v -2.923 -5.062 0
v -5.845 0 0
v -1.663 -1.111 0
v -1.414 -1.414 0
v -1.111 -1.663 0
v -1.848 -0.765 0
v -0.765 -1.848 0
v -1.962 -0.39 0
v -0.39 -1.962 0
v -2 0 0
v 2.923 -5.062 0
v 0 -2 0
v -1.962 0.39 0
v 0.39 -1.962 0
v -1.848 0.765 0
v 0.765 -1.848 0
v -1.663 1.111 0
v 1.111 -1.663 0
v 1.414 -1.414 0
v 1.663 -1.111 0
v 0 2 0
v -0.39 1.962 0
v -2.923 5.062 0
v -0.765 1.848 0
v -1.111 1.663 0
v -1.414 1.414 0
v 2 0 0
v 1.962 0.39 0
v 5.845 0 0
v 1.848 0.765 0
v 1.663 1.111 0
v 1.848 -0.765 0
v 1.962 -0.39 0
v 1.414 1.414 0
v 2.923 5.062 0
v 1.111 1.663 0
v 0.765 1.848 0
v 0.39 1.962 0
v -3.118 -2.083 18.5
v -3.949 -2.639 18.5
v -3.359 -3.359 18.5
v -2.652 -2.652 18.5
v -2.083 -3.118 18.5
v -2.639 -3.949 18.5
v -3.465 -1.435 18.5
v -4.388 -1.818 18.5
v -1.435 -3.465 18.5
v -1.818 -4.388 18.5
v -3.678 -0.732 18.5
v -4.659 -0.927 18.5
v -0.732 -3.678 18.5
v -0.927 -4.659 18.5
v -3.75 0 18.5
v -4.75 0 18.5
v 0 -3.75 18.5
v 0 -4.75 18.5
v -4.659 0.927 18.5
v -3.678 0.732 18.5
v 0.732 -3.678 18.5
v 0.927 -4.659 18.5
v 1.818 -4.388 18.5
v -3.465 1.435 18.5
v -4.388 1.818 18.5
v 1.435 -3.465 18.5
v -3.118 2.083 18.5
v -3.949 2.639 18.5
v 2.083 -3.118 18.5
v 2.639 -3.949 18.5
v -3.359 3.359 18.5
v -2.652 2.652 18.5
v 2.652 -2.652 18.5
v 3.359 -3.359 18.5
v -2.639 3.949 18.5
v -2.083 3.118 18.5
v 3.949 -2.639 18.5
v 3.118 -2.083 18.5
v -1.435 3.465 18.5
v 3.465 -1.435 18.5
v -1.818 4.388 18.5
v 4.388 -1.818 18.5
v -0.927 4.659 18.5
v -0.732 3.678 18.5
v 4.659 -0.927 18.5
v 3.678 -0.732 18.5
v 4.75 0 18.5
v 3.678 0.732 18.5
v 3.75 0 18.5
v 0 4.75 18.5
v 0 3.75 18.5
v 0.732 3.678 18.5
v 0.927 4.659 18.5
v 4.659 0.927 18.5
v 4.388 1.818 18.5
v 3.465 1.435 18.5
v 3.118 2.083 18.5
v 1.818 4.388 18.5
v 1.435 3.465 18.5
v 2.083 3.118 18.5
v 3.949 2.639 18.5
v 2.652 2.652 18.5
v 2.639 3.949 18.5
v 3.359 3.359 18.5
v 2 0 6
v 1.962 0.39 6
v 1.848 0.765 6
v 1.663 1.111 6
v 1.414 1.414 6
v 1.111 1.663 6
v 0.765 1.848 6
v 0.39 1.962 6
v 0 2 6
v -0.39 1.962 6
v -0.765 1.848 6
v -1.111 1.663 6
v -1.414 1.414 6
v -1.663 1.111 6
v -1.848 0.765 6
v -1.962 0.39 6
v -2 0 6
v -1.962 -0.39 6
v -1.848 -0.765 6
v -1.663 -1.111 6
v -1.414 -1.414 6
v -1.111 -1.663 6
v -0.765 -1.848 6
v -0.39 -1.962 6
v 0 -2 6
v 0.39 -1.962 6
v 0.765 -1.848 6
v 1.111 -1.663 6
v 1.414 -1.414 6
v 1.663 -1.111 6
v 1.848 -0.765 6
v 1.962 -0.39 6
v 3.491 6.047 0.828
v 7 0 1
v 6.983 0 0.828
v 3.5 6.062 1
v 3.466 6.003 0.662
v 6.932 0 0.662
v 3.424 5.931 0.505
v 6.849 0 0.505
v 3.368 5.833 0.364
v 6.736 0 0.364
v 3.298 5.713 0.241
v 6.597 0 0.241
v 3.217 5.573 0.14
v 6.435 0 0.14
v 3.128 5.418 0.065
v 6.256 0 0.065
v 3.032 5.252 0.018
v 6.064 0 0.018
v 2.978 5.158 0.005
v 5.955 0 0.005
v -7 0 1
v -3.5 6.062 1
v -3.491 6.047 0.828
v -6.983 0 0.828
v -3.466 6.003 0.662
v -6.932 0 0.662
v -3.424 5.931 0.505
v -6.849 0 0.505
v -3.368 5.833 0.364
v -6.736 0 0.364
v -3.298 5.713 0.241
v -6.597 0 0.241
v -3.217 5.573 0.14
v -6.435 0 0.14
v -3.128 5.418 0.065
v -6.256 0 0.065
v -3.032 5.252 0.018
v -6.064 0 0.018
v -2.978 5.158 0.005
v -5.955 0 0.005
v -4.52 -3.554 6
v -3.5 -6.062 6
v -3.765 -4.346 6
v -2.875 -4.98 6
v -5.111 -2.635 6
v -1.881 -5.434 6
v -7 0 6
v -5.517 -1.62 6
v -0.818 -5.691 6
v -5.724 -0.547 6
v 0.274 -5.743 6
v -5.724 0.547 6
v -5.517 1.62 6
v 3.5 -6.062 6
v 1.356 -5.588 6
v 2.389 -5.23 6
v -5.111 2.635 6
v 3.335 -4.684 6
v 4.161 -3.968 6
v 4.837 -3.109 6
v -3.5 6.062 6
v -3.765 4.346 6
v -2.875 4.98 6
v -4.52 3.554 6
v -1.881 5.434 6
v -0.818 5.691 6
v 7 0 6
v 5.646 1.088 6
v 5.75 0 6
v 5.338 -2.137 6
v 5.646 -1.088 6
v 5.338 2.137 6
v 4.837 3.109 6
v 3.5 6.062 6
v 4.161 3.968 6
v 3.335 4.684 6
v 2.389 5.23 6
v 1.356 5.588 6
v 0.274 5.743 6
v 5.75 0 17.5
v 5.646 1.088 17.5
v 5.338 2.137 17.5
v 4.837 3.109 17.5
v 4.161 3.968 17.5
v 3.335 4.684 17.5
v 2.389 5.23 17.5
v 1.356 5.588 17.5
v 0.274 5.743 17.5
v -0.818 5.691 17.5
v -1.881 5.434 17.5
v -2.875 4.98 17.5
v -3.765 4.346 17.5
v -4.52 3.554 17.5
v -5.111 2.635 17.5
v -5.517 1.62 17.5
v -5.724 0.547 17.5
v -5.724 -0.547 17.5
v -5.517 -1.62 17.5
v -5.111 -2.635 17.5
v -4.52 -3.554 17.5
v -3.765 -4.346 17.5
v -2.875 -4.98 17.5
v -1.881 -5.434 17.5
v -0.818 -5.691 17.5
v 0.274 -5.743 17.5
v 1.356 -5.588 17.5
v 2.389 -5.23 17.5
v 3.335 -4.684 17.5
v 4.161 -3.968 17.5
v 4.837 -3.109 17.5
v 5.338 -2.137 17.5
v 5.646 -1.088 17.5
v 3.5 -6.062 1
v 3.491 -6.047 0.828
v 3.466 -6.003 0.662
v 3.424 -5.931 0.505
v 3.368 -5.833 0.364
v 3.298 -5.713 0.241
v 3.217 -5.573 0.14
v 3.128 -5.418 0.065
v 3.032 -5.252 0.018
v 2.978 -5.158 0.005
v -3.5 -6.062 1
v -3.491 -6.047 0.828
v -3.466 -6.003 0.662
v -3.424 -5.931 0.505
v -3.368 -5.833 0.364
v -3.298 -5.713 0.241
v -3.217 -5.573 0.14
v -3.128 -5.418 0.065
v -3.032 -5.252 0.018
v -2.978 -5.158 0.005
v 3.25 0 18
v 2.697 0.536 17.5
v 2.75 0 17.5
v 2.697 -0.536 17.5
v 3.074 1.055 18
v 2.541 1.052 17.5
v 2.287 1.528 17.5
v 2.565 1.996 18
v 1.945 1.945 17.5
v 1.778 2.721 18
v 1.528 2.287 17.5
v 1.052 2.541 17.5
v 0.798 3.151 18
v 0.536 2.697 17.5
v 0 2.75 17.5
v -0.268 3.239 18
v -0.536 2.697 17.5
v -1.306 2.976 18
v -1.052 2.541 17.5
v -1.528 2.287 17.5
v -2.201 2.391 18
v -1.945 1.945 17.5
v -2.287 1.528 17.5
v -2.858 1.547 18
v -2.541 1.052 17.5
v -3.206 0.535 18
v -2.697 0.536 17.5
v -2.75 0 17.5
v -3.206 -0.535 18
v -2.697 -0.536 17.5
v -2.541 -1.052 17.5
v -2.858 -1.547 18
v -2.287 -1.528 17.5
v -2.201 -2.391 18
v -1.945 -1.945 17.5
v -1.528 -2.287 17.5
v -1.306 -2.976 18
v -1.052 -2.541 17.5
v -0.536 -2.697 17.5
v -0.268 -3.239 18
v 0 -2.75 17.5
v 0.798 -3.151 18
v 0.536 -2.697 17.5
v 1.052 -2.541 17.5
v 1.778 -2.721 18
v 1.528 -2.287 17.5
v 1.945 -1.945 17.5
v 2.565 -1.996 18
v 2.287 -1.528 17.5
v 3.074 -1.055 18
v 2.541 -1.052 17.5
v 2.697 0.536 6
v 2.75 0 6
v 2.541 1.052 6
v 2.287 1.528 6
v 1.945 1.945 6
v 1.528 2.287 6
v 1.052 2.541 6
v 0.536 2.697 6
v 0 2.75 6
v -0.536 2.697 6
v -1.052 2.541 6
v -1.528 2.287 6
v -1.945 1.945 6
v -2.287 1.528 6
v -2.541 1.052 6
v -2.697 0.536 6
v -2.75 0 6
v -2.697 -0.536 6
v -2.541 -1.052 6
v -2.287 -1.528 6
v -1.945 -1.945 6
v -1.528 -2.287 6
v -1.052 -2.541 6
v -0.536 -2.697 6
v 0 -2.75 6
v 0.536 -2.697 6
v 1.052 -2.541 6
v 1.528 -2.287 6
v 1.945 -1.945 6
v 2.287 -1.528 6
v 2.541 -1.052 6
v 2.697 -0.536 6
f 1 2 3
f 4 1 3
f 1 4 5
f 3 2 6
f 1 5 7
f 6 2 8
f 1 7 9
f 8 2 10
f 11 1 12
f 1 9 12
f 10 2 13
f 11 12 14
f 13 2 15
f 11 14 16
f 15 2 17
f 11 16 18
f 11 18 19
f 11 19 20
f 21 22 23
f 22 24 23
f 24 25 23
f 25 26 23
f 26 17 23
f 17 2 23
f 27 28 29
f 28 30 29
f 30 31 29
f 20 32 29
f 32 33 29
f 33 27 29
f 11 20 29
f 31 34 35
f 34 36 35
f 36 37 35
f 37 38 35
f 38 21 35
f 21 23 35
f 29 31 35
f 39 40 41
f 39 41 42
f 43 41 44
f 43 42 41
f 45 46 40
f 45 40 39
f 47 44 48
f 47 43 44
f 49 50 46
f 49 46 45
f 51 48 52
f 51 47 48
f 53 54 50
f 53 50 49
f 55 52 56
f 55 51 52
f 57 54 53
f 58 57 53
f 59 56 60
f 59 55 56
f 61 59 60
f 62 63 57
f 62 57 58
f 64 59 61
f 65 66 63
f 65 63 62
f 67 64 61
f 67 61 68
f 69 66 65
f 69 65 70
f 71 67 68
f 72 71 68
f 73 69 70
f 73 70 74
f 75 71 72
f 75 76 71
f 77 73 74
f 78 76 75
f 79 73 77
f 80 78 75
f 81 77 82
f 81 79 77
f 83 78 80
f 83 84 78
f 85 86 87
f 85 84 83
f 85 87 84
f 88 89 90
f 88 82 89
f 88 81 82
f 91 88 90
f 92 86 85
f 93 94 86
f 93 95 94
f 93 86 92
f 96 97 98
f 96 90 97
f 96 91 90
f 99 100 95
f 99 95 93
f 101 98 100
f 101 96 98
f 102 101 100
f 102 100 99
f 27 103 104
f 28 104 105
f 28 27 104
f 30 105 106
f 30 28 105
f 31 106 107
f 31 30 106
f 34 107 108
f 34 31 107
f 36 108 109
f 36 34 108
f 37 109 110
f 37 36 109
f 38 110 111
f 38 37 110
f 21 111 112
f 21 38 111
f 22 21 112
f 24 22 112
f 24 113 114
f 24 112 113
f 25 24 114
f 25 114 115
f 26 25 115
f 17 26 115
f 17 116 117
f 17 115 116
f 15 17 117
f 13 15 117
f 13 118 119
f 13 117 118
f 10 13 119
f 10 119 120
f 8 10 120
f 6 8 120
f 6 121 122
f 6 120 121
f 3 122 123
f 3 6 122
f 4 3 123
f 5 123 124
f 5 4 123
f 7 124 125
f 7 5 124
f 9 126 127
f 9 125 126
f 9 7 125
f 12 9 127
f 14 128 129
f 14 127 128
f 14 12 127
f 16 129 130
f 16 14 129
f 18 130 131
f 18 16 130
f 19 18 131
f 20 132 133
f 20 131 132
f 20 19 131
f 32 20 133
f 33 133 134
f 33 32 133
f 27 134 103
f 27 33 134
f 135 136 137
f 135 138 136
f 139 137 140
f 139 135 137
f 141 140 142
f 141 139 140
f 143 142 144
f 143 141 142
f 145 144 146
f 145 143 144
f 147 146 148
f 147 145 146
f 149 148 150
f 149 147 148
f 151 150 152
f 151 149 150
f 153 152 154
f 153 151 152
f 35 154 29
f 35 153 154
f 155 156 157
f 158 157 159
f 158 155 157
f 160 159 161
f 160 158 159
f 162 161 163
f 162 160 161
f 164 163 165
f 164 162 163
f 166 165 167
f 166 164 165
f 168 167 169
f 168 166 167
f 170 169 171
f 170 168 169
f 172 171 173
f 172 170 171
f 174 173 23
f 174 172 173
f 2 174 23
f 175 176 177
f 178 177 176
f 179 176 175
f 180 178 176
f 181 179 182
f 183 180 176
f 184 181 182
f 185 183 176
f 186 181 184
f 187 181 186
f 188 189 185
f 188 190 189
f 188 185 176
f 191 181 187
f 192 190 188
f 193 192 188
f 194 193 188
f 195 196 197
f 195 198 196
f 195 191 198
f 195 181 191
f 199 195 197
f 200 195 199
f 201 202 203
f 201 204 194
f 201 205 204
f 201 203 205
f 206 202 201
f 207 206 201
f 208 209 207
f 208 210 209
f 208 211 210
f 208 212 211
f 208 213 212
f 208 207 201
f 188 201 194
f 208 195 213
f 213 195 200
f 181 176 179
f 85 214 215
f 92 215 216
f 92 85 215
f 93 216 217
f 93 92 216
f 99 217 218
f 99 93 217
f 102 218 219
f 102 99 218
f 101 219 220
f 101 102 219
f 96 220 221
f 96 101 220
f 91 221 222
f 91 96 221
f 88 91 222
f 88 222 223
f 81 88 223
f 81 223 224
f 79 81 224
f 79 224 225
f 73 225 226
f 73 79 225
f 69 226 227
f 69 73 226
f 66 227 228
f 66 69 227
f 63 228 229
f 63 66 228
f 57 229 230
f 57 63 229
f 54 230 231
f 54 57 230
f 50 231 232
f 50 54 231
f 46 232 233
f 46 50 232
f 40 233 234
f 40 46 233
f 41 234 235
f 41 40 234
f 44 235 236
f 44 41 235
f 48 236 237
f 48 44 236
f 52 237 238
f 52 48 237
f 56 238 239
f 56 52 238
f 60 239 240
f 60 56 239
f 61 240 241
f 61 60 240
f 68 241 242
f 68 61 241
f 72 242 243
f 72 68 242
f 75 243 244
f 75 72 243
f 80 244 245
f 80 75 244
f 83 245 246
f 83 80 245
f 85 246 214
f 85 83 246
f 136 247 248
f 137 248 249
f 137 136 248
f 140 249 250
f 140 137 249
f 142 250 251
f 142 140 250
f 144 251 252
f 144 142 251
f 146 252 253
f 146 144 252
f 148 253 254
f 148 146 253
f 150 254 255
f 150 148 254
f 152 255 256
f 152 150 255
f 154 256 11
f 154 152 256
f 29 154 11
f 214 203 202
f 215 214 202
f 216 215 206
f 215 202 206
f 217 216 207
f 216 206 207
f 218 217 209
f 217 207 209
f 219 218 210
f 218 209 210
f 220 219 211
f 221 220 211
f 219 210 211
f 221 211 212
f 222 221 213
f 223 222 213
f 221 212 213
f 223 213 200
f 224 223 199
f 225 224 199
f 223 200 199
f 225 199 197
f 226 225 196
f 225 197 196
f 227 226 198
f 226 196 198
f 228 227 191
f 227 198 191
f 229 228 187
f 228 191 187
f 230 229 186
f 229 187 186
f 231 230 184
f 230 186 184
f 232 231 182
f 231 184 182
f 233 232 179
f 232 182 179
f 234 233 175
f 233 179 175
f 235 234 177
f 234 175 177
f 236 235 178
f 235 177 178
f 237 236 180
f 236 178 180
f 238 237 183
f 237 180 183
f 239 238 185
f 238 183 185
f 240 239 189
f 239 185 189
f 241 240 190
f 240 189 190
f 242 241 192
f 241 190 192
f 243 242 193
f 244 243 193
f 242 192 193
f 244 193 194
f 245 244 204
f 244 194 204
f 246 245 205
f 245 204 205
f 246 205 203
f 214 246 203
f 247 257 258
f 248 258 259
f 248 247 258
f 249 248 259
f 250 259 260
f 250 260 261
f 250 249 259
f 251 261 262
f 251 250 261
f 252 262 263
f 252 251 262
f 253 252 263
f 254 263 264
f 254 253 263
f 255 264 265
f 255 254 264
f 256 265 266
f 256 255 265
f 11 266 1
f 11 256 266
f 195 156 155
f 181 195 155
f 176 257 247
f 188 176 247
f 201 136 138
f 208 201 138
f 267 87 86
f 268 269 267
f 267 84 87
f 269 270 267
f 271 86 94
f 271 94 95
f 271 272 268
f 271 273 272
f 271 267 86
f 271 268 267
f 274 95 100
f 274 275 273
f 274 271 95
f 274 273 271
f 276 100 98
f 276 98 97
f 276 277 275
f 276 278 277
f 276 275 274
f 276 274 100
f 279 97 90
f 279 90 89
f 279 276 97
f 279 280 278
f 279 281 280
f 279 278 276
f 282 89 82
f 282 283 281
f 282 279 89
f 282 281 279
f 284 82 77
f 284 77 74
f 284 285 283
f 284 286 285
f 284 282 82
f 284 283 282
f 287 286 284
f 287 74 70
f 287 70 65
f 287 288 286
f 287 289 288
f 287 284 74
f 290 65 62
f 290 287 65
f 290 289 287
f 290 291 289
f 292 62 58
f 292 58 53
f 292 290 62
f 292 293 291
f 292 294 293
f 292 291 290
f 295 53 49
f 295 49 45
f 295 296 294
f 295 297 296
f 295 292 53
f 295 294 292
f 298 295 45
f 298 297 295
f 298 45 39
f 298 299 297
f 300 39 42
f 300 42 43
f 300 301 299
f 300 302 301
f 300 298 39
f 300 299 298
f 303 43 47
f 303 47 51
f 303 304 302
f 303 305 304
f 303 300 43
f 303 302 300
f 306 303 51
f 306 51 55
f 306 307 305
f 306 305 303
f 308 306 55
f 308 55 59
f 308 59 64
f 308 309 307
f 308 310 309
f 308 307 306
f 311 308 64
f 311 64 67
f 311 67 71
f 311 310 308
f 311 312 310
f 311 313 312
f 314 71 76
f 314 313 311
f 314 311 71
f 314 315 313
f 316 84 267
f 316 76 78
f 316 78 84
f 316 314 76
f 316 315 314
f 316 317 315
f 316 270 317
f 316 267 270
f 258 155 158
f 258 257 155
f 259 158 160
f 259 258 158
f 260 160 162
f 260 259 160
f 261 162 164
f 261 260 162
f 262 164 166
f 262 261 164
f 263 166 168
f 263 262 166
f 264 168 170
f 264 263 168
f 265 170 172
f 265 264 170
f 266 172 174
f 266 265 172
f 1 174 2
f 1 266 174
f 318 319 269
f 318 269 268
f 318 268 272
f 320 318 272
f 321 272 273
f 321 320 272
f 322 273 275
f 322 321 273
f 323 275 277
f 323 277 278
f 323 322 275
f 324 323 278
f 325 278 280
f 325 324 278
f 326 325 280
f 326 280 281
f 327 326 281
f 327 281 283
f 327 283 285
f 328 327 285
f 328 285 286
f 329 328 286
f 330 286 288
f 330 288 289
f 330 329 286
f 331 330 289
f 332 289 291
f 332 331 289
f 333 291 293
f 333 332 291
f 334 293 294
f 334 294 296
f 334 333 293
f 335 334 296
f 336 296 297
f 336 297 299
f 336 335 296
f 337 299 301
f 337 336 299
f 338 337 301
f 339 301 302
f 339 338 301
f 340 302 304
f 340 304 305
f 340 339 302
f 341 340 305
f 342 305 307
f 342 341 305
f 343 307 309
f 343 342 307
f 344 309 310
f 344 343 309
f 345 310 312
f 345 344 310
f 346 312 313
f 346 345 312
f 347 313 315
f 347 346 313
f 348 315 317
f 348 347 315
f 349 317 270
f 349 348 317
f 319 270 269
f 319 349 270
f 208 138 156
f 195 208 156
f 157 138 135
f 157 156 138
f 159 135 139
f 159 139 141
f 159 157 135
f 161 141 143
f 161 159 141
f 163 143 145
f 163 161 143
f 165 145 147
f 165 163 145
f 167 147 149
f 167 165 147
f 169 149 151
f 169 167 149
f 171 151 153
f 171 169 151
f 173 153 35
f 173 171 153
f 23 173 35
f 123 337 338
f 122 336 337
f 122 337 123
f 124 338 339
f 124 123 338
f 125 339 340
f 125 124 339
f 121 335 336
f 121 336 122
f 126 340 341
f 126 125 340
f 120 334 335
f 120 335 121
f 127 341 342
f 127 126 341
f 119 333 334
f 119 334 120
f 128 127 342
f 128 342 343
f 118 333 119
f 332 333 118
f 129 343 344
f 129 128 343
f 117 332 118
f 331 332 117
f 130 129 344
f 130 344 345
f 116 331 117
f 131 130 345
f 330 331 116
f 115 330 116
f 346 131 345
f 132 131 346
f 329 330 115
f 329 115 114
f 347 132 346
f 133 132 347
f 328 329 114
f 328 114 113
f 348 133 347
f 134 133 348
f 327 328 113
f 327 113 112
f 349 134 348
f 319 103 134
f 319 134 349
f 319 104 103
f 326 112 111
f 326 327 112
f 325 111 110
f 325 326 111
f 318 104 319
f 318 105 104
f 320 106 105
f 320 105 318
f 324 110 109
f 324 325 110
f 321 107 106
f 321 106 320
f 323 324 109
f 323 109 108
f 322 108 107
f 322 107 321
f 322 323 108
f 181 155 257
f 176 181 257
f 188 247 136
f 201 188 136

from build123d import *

# Parameters (mm, degrees)
PAD_DEPTH     = 6
SKETCH001_R   = 5.75
SKETCH001_R_2 = 2.75
PAD001_DEPTH  = 12.5
CHAMFER_SIZE  = 1
FILLET_R      = 1
SKETCH002_R   = 2
POCKET_DEPTH  = 18.501


with BuildPart() as part:
    # Sketch → Pad (new body)
    with BuildSketch(Plane.XY):
        Polygon((3.5, -6.062178), (7, 0), (3.5, 6.062178), (-3.5, 6.062178), (-7, 0), (-3.5, -6.062178), align=None)
    extrude(amount=PAD_DEPTH)

    # Sketch001 → Pad001 (join)
    with BuildSketch(Plane.XY.offset(6)):
        Circle(SKETCH001_R)
        Circle(SKETCH001_R_2, mode=Mode.SUBTRACT)
    extrude(amount=PAD001_DEPTH)

    # Chamfer
    chamfer_edges = [part.edges().sort_by_distance(p)[0] for p in [
        (-2.75, 0, 18.5),
        (-5.75, 0, 18.5),
    ]]
    chamfer(chamfer_edges, length=CHAMFER_SIZE)

    # Fillet
    fillet_edges = [part.edges().sort_by_distance(p)[0] for p in [
        (5.25, 3.031089, 0),
        (5.25, -3.031089, 0),
        (0, -6.062178, 0),
        (-5.25, -3.031089, 0),
        (-5.25, 3.031089, 0),
        (0, 6.062178, 0),
    ]]
    fillet(fillet_edges, radius=FILLET_R)

    # Sketch002 → Pocket (cut, through all)
    with BuildSketch(Plane.XY):
        Circle(SKETCH002_R)
    extrude(amount=POCKET_DEPTH, mode=Mode.SUBTRACT)


solid = part.part
